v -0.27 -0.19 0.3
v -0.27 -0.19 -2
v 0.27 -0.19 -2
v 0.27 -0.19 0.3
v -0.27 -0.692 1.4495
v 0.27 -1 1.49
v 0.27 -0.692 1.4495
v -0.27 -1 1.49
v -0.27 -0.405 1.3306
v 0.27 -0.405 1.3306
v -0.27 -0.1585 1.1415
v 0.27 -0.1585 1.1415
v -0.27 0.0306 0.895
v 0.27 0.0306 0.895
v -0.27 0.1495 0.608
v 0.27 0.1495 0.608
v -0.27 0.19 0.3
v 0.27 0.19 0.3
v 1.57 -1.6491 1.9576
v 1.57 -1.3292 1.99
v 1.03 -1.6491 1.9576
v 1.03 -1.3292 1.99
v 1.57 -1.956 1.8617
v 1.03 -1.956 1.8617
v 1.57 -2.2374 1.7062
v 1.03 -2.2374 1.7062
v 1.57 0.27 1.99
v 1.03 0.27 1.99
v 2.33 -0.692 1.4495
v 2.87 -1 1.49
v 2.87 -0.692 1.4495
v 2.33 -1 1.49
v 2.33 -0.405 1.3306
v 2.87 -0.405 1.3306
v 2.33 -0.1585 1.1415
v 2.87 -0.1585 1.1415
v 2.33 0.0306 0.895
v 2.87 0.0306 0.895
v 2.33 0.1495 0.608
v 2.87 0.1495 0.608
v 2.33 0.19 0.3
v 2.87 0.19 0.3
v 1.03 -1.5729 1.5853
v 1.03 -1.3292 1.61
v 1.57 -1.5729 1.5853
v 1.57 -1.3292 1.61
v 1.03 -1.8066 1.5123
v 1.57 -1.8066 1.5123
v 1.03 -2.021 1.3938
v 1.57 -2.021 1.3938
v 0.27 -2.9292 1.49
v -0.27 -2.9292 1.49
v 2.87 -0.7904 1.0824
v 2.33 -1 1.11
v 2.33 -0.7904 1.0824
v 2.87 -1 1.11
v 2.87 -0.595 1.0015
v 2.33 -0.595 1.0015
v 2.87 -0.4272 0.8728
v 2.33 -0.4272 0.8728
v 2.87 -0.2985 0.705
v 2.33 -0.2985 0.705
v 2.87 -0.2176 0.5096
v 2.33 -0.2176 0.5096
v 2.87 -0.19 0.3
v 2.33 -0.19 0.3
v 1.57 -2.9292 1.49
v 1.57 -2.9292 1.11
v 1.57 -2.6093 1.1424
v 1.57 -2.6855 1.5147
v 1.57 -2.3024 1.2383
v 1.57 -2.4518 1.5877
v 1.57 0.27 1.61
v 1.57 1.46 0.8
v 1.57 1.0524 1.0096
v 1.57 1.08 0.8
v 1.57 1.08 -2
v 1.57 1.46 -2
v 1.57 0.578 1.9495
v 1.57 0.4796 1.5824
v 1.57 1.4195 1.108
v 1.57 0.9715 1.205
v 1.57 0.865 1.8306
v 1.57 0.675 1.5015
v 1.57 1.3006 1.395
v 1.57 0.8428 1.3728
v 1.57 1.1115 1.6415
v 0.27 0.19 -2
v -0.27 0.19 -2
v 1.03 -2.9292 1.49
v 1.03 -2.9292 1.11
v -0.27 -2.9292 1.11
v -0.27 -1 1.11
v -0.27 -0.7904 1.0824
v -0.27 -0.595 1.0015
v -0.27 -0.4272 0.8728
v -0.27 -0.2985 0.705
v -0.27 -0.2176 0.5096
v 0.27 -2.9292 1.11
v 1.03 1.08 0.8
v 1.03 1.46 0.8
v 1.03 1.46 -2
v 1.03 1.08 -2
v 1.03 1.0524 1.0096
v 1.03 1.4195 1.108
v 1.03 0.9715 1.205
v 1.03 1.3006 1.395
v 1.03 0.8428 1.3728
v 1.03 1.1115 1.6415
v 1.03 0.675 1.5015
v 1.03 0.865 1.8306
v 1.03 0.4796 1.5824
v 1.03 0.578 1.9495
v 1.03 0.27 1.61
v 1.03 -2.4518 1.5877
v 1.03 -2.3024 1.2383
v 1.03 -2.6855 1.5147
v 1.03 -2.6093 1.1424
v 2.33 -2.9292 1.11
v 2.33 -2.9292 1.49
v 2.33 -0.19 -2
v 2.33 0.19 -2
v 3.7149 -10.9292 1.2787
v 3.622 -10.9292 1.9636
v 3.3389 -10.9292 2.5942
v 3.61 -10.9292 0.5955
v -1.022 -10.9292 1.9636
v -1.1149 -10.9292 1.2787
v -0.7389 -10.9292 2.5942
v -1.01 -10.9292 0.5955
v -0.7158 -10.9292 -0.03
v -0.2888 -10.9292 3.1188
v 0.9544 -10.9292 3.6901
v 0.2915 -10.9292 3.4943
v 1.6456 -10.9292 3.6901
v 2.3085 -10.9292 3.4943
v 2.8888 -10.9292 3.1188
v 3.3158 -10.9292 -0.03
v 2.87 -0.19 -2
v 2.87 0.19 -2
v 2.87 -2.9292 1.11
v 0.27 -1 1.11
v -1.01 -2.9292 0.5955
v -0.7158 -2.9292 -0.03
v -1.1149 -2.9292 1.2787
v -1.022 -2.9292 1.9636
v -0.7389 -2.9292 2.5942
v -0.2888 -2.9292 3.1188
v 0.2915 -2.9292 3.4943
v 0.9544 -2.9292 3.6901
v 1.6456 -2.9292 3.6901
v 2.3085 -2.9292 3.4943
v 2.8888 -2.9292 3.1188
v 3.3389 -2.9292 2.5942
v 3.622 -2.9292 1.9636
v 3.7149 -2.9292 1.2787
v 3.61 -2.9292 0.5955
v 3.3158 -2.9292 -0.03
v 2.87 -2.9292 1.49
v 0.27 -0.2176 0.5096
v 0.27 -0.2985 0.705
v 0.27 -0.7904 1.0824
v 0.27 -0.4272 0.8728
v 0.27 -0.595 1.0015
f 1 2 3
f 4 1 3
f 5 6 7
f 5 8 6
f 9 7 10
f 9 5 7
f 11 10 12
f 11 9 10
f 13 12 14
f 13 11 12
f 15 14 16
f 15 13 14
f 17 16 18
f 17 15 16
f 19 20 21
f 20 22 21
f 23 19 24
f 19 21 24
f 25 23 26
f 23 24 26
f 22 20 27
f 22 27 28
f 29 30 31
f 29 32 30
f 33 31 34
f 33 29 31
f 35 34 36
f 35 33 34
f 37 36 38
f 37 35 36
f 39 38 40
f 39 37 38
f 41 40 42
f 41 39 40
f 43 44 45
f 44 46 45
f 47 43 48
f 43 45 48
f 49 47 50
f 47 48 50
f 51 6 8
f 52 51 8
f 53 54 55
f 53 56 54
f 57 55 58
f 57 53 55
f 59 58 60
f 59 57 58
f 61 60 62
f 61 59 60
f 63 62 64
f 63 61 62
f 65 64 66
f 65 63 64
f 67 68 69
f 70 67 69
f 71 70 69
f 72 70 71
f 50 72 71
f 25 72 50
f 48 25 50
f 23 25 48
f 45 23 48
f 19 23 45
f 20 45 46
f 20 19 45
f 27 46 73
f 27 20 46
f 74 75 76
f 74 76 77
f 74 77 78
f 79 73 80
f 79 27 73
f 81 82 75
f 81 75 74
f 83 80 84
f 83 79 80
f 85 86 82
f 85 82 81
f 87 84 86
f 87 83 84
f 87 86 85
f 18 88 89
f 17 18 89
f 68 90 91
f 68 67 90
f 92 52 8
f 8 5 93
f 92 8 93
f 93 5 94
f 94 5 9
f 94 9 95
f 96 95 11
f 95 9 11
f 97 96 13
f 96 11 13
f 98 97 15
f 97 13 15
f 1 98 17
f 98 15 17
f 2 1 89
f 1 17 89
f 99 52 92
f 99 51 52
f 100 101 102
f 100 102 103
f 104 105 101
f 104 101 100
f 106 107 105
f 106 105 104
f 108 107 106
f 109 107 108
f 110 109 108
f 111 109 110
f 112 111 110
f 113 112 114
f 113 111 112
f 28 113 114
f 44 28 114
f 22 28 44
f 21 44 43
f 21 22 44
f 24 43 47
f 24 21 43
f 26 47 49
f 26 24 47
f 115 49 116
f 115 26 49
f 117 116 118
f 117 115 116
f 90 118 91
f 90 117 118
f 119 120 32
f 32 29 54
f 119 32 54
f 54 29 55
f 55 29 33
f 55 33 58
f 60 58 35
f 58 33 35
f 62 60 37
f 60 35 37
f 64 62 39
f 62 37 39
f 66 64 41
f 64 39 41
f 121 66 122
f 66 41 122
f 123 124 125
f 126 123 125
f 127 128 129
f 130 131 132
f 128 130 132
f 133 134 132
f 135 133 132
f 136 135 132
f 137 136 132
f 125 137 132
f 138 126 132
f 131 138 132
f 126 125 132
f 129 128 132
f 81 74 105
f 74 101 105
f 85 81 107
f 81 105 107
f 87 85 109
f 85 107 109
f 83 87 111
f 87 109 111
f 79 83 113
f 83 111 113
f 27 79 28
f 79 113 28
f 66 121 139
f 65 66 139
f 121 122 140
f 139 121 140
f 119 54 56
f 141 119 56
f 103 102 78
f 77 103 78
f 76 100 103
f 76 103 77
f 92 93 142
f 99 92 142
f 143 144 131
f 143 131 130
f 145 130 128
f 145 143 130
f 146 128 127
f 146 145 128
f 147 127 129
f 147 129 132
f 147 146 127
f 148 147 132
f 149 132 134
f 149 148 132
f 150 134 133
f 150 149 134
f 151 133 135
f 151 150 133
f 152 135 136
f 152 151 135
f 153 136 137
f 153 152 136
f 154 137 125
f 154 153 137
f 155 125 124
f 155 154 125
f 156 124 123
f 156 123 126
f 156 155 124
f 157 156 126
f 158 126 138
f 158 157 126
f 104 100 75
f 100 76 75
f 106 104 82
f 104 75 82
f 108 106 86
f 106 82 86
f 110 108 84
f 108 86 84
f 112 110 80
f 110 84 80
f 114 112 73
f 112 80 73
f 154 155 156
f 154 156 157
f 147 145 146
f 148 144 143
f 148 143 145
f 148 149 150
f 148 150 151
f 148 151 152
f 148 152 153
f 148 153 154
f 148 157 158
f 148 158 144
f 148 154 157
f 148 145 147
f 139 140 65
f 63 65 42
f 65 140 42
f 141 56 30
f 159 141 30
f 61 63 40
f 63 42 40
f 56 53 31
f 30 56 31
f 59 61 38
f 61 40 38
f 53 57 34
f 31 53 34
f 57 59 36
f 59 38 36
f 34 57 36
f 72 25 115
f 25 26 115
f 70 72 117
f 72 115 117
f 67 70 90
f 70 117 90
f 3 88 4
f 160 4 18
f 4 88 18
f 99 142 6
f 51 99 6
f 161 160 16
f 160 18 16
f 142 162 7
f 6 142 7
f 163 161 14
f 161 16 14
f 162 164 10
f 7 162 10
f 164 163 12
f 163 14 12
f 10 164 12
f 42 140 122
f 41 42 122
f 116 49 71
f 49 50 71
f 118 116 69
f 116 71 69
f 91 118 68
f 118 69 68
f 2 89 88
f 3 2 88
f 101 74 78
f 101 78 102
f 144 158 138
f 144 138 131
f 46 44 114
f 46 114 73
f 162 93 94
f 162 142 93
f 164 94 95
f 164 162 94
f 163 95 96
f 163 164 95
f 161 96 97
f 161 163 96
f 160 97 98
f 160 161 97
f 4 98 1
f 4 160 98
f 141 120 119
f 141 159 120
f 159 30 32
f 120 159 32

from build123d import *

# Parameters (mm, degrees)
SKETCH006_W = 0.54
SKETCH006_H = 0.38
SKETCH008_W = 0.54
SKETCH008_H = 0.38
SKETCH010_W = 0.54
SKETCH010_H = 0.38
PAD_DEPTH   = 8


with BuildPart() as body001:
    # AdditivePipe: sweep along a path in Sketch005
    with BuildLine(Plane.YZ) as additivepipe_path:
        Line((-2.929204, 1.3), (-1, 1.3))
        ThreePointArc((-1, 1.3), (-0.292893, 1.007107), (0, 0.3))
        Line((0, 0.3), (0, -2))
    # Sketch006 → AdditivePipe (sweep)
    with BuildSketch(Plane.XY):
        Rectangle(SKETCH006_W, SKETCH006_H)
    sweep(path=additivepipe_path.line)


with BuildPart() as body002:
    # AdditivePipe001: sweep along a path in Sketch007
    with BuildLine(Plane.YZ) as additivepipe001_path:
        Line((-2.929204, 1.3), (-1, 1.3))
        ThreePointArc((-1, 1.3), (-0.292893, 1.007107), (0, 0.3))
        Line((0, 0.3), (0, -2))
    # Sketch008 → AdditivePipe001 (sweep)
    with BuildSketch(Plane.XY):
        with Locations((2.6, 0)):
            Rectangle(SKETCH008_W, SKETCH008_H)
    sweep(path=additivepipe001_path.line)


with BuildPart() as body003:
    # AdditivePipe002: sweep along a path in Sketch009
    with BuildLine(Plane.YZ) as additivepipe002_path:
        Line((1.27, -2), (1.27, 0.8))
        ThreePointArc((1.27, 0.8), (0.977107, 1.507107), (0.27, 1.8))
        Line((0.27, 1.8), (-1.329204, 1.8))
        ThreePointArc((-1.329204, 1.8), (-1.74828, 1.736044), (-2.129204, 1.55))
        ThreePointArc((-2.129204, 1.55), (-2.510128, 1.363956), (-2.929204, 1.3))
    # Sketch010 → AdditivePipe002 (sweep)
    with BuildSketch(Plane.XY):
        with Locations((1.3, 1.27)):
            Rectangle(SKETCH010_W, SKETCH010_H)
    sweep(path=additivepipe002_path.line)


with BuildPart() as housing:
    # Sketch011 (on DatumPlane) → Pad (new body)
    with BuildSketch(Plane(origin=(0, -2.929204, 1.3), x_dir=(-1, 0, 0), z_dir=(0, 1, 0))):
        with BuildLine():
            ThreePointArc((0.715769, -1.33), (-1.3, 2.415), (-3.315769, -1.33))
            Line((-3.315769, -1.33), (0.715769, -1.33))
        make_face()
    extrude(amount=-PAD_DEPTH)


solid = Compound([body001.part, body002.part, body003.part, housing.part])
